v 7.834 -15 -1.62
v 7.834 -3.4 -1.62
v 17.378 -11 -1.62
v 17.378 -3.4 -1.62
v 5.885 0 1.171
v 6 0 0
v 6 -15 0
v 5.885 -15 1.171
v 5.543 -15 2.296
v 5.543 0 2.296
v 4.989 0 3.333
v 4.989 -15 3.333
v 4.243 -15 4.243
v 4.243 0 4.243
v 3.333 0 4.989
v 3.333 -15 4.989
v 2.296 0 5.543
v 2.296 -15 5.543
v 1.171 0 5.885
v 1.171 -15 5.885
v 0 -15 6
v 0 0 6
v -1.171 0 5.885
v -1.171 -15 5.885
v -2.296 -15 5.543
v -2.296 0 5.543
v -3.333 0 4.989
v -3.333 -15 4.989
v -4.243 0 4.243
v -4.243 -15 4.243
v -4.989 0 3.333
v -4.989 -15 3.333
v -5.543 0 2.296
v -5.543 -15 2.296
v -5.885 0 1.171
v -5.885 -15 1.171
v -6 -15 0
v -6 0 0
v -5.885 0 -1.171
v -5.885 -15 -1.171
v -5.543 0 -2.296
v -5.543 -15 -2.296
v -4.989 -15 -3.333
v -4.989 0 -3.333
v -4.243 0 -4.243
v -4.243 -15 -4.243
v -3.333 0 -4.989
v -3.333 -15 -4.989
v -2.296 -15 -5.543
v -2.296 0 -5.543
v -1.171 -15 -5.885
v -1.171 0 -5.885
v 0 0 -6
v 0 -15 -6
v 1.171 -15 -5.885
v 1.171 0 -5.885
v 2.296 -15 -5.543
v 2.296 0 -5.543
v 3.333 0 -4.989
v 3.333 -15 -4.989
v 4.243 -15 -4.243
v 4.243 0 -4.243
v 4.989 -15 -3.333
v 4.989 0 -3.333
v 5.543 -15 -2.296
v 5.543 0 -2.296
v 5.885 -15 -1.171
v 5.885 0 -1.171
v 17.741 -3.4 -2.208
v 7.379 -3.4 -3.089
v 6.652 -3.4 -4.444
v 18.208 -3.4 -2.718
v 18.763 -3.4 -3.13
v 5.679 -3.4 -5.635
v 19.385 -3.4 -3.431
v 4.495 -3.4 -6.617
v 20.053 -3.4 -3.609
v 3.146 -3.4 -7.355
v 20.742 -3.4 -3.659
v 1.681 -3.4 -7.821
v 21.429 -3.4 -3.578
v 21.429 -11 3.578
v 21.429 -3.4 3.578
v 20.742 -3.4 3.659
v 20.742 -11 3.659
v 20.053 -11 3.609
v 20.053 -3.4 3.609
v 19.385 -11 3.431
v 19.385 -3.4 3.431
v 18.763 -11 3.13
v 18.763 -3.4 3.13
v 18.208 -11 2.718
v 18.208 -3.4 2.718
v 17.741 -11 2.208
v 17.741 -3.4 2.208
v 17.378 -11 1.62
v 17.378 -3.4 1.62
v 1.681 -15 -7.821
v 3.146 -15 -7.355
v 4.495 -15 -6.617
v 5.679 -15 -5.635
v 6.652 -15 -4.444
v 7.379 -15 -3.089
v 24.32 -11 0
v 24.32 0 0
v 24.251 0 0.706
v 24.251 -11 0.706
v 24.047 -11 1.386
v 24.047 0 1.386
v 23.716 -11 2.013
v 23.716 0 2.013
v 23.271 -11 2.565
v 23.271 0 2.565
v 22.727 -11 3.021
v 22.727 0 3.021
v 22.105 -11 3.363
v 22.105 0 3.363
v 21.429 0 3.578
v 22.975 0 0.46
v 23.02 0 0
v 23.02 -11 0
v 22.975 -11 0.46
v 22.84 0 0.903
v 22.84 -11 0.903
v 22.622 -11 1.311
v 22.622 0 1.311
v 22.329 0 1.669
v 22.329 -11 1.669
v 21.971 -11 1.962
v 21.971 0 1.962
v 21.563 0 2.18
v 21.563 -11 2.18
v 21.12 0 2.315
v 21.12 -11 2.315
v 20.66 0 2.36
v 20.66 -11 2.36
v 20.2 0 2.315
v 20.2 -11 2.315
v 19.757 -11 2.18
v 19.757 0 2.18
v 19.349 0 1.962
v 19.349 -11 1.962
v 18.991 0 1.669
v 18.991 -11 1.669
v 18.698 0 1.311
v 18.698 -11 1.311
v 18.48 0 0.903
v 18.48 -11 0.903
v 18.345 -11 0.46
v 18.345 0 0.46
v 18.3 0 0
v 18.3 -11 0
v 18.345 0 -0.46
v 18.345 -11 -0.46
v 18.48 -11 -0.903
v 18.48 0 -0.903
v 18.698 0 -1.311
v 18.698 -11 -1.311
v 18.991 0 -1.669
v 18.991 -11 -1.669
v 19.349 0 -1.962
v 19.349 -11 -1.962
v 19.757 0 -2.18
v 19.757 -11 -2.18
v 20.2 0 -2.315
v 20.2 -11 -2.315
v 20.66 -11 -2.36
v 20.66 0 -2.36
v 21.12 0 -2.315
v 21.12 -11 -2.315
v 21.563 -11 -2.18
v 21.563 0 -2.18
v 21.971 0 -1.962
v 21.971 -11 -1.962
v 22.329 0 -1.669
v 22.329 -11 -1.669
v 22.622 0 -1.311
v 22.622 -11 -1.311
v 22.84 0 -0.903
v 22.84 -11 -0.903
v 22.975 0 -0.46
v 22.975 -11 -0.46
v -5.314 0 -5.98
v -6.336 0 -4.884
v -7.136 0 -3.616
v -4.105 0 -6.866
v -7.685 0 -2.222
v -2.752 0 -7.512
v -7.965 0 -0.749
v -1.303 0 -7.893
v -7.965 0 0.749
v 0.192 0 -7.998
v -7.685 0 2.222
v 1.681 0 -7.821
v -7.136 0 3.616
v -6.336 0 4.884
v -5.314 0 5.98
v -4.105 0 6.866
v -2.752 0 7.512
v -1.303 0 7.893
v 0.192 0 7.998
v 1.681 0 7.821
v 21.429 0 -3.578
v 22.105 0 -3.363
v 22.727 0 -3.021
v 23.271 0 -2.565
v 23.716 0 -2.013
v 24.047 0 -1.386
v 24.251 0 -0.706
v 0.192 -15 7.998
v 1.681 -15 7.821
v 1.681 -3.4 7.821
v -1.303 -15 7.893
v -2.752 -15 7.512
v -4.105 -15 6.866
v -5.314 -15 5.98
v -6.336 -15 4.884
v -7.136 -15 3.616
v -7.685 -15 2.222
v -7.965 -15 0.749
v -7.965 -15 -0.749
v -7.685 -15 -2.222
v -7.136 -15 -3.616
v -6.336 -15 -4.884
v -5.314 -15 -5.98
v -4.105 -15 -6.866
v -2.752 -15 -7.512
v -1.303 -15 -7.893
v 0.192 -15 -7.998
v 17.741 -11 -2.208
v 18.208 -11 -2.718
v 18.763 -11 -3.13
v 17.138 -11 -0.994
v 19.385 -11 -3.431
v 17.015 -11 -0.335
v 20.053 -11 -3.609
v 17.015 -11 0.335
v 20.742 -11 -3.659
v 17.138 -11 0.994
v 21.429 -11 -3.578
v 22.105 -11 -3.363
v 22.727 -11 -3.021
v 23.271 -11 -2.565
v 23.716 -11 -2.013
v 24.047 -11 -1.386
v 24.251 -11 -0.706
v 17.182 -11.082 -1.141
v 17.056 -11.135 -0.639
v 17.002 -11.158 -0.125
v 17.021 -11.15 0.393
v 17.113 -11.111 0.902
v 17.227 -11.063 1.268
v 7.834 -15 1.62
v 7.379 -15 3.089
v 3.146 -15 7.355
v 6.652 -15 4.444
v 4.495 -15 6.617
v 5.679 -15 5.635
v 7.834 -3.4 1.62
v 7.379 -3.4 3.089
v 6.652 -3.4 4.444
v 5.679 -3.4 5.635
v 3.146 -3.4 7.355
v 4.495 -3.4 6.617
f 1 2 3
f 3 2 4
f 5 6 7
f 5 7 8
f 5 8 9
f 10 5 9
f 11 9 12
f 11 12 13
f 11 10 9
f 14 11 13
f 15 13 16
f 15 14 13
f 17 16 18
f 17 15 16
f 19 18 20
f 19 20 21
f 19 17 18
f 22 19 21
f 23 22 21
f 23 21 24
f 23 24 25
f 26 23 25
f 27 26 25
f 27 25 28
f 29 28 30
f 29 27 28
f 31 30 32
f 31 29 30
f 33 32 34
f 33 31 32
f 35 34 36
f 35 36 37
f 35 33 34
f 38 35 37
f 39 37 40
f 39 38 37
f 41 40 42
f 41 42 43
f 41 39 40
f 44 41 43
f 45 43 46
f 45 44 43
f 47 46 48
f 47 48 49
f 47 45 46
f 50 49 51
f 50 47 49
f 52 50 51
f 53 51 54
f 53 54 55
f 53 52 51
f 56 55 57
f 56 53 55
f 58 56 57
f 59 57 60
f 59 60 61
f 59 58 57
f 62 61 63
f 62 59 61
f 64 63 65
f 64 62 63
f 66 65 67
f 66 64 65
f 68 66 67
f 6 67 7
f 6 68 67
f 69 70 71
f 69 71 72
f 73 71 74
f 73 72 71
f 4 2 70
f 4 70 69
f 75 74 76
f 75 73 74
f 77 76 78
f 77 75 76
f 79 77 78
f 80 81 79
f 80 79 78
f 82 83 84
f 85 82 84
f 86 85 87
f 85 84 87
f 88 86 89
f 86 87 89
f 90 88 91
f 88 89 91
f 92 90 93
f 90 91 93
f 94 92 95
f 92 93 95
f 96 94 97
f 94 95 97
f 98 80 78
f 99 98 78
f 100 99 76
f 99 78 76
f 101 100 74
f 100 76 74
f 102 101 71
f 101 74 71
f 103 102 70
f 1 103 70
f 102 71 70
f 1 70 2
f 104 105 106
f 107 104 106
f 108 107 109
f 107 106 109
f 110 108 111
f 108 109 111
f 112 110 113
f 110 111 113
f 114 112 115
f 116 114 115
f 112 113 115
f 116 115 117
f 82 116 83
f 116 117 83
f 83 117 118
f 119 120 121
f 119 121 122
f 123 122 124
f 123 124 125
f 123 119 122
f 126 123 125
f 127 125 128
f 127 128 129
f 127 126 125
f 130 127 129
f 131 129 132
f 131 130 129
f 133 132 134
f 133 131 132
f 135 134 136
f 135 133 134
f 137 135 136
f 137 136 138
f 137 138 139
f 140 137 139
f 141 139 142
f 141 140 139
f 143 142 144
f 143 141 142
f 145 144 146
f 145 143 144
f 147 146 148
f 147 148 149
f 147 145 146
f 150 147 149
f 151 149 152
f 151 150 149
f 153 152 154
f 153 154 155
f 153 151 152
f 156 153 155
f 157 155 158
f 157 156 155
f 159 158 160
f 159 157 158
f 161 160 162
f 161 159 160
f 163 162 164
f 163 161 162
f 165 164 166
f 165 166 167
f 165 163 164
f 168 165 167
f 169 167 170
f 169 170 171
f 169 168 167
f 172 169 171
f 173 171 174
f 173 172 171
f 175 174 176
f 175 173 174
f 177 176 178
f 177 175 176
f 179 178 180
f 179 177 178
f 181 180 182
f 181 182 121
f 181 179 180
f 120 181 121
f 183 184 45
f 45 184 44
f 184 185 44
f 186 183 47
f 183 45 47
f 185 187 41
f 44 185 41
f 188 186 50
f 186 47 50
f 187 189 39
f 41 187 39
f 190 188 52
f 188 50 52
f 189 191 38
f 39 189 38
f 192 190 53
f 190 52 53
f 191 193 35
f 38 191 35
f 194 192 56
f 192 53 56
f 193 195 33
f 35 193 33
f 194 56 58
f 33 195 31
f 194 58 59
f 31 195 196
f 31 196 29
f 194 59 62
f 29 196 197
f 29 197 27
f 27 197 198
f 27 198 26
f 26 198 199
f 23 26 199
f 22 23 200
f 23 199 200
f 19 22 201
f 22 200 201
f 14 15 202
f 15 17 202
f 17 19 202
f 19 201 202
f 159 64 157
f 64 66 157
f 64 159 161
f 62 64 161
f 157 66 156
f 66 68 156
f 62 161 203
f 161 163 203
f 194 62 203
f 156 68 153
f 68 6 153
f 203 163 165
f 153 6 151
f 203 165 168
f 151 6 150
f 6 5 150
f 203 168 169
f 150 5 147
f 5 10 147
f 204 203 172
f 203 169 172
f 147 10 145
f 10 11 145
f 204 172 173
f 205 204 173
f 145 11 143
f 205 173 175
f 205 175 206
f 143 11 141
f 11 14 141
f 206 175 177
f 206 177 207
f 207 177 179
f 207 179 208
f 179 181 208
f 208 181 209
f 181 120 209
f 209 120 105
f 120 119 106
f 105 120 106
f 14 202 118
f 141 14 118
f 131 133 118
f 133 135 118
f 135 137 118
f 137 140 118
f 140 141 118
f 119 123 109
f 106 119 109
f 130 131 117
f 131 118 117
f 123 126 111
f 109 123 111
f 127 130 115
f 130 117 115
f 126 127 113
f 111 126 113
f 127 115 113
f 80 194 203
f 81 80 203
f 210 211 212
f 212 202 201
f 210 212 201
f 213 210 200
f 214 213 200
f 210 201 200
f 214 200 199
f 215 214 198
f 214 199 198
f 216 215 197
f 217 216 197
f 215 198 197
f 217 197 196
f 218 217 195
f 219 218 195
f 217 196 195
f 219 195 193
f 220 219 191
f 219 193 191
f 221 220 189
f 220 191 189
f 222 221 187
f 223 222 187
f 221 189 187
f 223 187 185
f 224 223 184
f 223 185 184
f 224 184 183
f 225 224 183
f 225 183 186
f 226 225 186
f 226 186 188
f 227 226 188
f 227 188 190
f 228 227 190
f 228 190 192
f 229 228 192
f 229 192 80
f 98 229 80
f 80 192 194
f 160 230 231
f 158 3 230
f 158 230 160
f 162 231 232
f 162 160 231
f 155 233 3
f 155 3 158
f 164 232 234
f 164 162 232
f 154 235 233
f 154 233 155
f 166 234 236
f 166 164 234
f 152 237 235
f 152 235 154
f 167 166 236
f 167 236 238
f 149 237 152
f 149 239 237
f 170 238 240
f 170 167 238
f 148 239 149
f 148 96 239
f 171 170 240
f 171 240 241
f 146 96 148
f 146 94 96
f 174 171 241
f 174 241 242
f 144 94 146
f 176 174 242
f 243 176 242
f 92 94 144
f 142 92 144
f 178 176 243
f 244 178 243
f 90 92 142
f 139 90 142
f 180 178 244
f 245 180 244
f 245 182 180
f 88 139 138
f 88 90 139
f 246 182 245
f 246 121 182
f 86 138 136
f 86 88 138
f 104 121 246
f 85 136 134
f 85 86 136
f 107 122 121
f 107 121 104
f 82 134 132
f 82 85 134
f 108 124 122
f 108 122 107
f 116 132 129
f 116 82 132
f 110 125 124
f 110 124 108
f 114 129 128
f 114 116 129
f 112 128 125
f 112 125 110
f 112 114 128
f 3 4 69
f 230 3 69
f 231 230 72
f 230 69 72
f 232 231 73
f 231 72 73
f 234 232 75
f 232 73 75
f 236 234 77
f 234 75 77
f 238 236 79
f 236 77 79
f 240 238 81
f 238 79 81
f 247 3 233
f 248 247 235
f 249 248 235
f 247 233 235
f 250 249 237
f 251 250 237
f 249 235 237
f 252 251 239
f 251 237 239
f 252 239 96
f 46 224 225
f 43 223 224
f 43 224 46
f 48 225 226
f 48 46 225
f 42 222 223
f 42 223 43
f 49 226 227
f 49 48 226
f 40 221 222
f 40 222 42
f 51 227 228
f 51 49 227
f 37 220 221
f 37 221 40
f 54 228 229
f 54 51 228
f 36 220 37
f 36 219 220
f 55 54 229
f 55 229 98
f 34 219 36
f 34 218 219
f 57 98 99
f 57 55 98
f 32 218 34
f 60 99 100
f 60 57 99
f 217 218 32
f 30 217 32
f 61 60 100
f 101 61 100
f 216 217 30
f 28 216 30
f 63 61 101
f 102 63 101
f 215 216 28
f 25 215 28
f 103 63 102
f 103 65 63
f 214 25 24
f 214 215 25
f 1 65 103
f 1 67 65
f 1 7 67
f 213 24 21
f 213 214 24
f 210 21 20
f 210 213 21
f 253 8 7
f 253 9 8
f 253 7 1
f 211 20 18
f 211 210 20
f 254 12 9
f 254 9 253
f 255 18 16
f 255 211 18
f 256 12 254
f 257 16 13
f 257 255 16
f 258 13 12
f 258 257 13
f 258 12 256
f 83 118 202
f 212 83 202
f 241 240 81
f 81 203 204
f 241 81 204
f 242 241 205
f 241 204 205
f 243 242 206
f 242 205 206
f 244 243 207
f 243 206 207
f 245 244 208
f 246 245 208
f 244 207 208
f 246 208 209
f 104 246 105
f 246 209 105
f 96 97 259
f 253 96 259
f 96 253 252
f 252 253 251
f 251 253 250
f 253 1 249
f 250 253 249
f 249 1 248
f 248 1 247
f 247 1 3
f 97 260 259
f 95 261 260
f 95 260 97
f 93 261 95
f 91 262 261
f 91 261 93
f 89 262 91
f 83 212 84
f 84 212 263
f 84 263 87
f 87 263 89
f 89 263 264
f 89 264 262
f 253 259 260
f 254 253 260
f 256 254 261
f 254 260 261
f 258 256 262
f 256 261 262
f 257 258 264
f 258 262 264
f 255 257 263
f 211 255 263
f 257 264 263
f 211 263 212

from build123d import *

# Parameters (mm, degrees)
F0_R     = 6
F1_DEPTH = 15
F2_DEPTH = 15
F0_R_2   = 2.36
F3_DEPTH = 11
F5_DEPTH = 25
F6_DEPTH = 3.4


with BuildPart() as f1:
    # F0 (on Front) → F1 (new body)
    with BuildSketch(Plane.XZ):
        with BuildLine():
            ThreePointArc((7.834258, -1.62), (7.958457, -0.814228), (8, 0))
            ThreePointArc((8, 0), (7.958457, 0.814228), (7.834258, 1.62))
            ThreePointArc((7.834258, 1.62), (5.678687, 5.634937), (1.680542, 7.821495))
            ThreePointArc((1.680542, 7.821495), (-8, 0), (1.680542, -7.821495))
            ThreePointArc((1.680542, -7.821495), (5.678687, -5.634937), (7.834258, -1.62))
        make_face()
        Circle(F0_R, mode=Mode.SUBTRACT)
    extrude(amount=F1_DEPTH)

    # F0 (on Front) → F2 (join)
    with BuildSketch(Plane.XZ):
        with BuildLine():
            ThreePointArc((7.834258, 1.62), (7.958457, 0.814228), (8, 0))
            ThreePointArc((8, 0), (7.958457, -0.814228), (7.834258, -1.62))
            Line((7.834258, -1.62), (17.378049, -1.62))
            ThreePointArc((17.378049, -1.62), (17, 0), (17.378049, 1.62))
            Line((17.378049, 1.62), (7.834258, 1.62))
        make_face()
    extrude(amount=F2_DEPTH)

    # F0 (on Front) → F3 (join)
    with BuildSketch(Plane.XZ):
        with BuildLine():
            ThreePointArc((21.428848, 3.578334), (19.066987, 3.295134), (17.378049, 1.62))
            ThreePointArc((17.378049, 1.62), (17, 0), (17.378049, -1.62))
            ThreePointArc((17.378049, -1.62), (19.066987, -3.295134), (21.428848, -3.578334))
            ThreePointArc((21.428848, -3.578334), (23.506892, -2.300176), (24.32, 0))
            ThreePointArc((24.32, 0), (23.506892, 2.300176), (21.428848, 3.578334))
        make_face()
        with Locations((20.66, 0)):
            Circle(F0_R_2, mode=Mode.SUBTRACT)
    extrude(amount=F3_DEPTH)

    # F4 (on face) → F5 (cut)
    with BuildSketch(Plane(origin=(0, 0, -1.62), x_dir=(1, 0, 0), z_dir=(0, 0, -1))):
        Polygon((17.378049, 15), (7.834258, 15), (17.378049, 11), align=None)
    extrude(amount=-F5_DEPTH, mode=Mode.SUBTRACT)

    # F0 (on Front) → F6 (join)
    with BuildSketch(Plane.XZ):
        with BuildLine():
            ThreePointArc((1.680542, 7.821495), (5.678687, 5.634937), (7.834258, 1.62))
            Line((7.834258, 1.62), (17.378049, 1.62))
            ThreePointArc((17.378049, 1.62), (19.066987, 3.295134), (21.428848, 3.578334))
            Line((21.428848, 3.578334), (1.680542, 7.821495))
        make_face()
        with BuildLine():
            Line((17.378049, -1.62), (7.834258, -1.62))
            ThreePointArc((7.834258, -1.62), (5.678687, -5.634937), (1.680542, -7.821495))
            Line((1.680542, -7.821495), (21.428848, -3.578334))
            ThreePointArc((21.428848, -3.578334), (19.066987, -3.295134), (17.378049, -1.62))
        make_face()
    extrude(amount=F6_DEPTH)


solid = f1.part
